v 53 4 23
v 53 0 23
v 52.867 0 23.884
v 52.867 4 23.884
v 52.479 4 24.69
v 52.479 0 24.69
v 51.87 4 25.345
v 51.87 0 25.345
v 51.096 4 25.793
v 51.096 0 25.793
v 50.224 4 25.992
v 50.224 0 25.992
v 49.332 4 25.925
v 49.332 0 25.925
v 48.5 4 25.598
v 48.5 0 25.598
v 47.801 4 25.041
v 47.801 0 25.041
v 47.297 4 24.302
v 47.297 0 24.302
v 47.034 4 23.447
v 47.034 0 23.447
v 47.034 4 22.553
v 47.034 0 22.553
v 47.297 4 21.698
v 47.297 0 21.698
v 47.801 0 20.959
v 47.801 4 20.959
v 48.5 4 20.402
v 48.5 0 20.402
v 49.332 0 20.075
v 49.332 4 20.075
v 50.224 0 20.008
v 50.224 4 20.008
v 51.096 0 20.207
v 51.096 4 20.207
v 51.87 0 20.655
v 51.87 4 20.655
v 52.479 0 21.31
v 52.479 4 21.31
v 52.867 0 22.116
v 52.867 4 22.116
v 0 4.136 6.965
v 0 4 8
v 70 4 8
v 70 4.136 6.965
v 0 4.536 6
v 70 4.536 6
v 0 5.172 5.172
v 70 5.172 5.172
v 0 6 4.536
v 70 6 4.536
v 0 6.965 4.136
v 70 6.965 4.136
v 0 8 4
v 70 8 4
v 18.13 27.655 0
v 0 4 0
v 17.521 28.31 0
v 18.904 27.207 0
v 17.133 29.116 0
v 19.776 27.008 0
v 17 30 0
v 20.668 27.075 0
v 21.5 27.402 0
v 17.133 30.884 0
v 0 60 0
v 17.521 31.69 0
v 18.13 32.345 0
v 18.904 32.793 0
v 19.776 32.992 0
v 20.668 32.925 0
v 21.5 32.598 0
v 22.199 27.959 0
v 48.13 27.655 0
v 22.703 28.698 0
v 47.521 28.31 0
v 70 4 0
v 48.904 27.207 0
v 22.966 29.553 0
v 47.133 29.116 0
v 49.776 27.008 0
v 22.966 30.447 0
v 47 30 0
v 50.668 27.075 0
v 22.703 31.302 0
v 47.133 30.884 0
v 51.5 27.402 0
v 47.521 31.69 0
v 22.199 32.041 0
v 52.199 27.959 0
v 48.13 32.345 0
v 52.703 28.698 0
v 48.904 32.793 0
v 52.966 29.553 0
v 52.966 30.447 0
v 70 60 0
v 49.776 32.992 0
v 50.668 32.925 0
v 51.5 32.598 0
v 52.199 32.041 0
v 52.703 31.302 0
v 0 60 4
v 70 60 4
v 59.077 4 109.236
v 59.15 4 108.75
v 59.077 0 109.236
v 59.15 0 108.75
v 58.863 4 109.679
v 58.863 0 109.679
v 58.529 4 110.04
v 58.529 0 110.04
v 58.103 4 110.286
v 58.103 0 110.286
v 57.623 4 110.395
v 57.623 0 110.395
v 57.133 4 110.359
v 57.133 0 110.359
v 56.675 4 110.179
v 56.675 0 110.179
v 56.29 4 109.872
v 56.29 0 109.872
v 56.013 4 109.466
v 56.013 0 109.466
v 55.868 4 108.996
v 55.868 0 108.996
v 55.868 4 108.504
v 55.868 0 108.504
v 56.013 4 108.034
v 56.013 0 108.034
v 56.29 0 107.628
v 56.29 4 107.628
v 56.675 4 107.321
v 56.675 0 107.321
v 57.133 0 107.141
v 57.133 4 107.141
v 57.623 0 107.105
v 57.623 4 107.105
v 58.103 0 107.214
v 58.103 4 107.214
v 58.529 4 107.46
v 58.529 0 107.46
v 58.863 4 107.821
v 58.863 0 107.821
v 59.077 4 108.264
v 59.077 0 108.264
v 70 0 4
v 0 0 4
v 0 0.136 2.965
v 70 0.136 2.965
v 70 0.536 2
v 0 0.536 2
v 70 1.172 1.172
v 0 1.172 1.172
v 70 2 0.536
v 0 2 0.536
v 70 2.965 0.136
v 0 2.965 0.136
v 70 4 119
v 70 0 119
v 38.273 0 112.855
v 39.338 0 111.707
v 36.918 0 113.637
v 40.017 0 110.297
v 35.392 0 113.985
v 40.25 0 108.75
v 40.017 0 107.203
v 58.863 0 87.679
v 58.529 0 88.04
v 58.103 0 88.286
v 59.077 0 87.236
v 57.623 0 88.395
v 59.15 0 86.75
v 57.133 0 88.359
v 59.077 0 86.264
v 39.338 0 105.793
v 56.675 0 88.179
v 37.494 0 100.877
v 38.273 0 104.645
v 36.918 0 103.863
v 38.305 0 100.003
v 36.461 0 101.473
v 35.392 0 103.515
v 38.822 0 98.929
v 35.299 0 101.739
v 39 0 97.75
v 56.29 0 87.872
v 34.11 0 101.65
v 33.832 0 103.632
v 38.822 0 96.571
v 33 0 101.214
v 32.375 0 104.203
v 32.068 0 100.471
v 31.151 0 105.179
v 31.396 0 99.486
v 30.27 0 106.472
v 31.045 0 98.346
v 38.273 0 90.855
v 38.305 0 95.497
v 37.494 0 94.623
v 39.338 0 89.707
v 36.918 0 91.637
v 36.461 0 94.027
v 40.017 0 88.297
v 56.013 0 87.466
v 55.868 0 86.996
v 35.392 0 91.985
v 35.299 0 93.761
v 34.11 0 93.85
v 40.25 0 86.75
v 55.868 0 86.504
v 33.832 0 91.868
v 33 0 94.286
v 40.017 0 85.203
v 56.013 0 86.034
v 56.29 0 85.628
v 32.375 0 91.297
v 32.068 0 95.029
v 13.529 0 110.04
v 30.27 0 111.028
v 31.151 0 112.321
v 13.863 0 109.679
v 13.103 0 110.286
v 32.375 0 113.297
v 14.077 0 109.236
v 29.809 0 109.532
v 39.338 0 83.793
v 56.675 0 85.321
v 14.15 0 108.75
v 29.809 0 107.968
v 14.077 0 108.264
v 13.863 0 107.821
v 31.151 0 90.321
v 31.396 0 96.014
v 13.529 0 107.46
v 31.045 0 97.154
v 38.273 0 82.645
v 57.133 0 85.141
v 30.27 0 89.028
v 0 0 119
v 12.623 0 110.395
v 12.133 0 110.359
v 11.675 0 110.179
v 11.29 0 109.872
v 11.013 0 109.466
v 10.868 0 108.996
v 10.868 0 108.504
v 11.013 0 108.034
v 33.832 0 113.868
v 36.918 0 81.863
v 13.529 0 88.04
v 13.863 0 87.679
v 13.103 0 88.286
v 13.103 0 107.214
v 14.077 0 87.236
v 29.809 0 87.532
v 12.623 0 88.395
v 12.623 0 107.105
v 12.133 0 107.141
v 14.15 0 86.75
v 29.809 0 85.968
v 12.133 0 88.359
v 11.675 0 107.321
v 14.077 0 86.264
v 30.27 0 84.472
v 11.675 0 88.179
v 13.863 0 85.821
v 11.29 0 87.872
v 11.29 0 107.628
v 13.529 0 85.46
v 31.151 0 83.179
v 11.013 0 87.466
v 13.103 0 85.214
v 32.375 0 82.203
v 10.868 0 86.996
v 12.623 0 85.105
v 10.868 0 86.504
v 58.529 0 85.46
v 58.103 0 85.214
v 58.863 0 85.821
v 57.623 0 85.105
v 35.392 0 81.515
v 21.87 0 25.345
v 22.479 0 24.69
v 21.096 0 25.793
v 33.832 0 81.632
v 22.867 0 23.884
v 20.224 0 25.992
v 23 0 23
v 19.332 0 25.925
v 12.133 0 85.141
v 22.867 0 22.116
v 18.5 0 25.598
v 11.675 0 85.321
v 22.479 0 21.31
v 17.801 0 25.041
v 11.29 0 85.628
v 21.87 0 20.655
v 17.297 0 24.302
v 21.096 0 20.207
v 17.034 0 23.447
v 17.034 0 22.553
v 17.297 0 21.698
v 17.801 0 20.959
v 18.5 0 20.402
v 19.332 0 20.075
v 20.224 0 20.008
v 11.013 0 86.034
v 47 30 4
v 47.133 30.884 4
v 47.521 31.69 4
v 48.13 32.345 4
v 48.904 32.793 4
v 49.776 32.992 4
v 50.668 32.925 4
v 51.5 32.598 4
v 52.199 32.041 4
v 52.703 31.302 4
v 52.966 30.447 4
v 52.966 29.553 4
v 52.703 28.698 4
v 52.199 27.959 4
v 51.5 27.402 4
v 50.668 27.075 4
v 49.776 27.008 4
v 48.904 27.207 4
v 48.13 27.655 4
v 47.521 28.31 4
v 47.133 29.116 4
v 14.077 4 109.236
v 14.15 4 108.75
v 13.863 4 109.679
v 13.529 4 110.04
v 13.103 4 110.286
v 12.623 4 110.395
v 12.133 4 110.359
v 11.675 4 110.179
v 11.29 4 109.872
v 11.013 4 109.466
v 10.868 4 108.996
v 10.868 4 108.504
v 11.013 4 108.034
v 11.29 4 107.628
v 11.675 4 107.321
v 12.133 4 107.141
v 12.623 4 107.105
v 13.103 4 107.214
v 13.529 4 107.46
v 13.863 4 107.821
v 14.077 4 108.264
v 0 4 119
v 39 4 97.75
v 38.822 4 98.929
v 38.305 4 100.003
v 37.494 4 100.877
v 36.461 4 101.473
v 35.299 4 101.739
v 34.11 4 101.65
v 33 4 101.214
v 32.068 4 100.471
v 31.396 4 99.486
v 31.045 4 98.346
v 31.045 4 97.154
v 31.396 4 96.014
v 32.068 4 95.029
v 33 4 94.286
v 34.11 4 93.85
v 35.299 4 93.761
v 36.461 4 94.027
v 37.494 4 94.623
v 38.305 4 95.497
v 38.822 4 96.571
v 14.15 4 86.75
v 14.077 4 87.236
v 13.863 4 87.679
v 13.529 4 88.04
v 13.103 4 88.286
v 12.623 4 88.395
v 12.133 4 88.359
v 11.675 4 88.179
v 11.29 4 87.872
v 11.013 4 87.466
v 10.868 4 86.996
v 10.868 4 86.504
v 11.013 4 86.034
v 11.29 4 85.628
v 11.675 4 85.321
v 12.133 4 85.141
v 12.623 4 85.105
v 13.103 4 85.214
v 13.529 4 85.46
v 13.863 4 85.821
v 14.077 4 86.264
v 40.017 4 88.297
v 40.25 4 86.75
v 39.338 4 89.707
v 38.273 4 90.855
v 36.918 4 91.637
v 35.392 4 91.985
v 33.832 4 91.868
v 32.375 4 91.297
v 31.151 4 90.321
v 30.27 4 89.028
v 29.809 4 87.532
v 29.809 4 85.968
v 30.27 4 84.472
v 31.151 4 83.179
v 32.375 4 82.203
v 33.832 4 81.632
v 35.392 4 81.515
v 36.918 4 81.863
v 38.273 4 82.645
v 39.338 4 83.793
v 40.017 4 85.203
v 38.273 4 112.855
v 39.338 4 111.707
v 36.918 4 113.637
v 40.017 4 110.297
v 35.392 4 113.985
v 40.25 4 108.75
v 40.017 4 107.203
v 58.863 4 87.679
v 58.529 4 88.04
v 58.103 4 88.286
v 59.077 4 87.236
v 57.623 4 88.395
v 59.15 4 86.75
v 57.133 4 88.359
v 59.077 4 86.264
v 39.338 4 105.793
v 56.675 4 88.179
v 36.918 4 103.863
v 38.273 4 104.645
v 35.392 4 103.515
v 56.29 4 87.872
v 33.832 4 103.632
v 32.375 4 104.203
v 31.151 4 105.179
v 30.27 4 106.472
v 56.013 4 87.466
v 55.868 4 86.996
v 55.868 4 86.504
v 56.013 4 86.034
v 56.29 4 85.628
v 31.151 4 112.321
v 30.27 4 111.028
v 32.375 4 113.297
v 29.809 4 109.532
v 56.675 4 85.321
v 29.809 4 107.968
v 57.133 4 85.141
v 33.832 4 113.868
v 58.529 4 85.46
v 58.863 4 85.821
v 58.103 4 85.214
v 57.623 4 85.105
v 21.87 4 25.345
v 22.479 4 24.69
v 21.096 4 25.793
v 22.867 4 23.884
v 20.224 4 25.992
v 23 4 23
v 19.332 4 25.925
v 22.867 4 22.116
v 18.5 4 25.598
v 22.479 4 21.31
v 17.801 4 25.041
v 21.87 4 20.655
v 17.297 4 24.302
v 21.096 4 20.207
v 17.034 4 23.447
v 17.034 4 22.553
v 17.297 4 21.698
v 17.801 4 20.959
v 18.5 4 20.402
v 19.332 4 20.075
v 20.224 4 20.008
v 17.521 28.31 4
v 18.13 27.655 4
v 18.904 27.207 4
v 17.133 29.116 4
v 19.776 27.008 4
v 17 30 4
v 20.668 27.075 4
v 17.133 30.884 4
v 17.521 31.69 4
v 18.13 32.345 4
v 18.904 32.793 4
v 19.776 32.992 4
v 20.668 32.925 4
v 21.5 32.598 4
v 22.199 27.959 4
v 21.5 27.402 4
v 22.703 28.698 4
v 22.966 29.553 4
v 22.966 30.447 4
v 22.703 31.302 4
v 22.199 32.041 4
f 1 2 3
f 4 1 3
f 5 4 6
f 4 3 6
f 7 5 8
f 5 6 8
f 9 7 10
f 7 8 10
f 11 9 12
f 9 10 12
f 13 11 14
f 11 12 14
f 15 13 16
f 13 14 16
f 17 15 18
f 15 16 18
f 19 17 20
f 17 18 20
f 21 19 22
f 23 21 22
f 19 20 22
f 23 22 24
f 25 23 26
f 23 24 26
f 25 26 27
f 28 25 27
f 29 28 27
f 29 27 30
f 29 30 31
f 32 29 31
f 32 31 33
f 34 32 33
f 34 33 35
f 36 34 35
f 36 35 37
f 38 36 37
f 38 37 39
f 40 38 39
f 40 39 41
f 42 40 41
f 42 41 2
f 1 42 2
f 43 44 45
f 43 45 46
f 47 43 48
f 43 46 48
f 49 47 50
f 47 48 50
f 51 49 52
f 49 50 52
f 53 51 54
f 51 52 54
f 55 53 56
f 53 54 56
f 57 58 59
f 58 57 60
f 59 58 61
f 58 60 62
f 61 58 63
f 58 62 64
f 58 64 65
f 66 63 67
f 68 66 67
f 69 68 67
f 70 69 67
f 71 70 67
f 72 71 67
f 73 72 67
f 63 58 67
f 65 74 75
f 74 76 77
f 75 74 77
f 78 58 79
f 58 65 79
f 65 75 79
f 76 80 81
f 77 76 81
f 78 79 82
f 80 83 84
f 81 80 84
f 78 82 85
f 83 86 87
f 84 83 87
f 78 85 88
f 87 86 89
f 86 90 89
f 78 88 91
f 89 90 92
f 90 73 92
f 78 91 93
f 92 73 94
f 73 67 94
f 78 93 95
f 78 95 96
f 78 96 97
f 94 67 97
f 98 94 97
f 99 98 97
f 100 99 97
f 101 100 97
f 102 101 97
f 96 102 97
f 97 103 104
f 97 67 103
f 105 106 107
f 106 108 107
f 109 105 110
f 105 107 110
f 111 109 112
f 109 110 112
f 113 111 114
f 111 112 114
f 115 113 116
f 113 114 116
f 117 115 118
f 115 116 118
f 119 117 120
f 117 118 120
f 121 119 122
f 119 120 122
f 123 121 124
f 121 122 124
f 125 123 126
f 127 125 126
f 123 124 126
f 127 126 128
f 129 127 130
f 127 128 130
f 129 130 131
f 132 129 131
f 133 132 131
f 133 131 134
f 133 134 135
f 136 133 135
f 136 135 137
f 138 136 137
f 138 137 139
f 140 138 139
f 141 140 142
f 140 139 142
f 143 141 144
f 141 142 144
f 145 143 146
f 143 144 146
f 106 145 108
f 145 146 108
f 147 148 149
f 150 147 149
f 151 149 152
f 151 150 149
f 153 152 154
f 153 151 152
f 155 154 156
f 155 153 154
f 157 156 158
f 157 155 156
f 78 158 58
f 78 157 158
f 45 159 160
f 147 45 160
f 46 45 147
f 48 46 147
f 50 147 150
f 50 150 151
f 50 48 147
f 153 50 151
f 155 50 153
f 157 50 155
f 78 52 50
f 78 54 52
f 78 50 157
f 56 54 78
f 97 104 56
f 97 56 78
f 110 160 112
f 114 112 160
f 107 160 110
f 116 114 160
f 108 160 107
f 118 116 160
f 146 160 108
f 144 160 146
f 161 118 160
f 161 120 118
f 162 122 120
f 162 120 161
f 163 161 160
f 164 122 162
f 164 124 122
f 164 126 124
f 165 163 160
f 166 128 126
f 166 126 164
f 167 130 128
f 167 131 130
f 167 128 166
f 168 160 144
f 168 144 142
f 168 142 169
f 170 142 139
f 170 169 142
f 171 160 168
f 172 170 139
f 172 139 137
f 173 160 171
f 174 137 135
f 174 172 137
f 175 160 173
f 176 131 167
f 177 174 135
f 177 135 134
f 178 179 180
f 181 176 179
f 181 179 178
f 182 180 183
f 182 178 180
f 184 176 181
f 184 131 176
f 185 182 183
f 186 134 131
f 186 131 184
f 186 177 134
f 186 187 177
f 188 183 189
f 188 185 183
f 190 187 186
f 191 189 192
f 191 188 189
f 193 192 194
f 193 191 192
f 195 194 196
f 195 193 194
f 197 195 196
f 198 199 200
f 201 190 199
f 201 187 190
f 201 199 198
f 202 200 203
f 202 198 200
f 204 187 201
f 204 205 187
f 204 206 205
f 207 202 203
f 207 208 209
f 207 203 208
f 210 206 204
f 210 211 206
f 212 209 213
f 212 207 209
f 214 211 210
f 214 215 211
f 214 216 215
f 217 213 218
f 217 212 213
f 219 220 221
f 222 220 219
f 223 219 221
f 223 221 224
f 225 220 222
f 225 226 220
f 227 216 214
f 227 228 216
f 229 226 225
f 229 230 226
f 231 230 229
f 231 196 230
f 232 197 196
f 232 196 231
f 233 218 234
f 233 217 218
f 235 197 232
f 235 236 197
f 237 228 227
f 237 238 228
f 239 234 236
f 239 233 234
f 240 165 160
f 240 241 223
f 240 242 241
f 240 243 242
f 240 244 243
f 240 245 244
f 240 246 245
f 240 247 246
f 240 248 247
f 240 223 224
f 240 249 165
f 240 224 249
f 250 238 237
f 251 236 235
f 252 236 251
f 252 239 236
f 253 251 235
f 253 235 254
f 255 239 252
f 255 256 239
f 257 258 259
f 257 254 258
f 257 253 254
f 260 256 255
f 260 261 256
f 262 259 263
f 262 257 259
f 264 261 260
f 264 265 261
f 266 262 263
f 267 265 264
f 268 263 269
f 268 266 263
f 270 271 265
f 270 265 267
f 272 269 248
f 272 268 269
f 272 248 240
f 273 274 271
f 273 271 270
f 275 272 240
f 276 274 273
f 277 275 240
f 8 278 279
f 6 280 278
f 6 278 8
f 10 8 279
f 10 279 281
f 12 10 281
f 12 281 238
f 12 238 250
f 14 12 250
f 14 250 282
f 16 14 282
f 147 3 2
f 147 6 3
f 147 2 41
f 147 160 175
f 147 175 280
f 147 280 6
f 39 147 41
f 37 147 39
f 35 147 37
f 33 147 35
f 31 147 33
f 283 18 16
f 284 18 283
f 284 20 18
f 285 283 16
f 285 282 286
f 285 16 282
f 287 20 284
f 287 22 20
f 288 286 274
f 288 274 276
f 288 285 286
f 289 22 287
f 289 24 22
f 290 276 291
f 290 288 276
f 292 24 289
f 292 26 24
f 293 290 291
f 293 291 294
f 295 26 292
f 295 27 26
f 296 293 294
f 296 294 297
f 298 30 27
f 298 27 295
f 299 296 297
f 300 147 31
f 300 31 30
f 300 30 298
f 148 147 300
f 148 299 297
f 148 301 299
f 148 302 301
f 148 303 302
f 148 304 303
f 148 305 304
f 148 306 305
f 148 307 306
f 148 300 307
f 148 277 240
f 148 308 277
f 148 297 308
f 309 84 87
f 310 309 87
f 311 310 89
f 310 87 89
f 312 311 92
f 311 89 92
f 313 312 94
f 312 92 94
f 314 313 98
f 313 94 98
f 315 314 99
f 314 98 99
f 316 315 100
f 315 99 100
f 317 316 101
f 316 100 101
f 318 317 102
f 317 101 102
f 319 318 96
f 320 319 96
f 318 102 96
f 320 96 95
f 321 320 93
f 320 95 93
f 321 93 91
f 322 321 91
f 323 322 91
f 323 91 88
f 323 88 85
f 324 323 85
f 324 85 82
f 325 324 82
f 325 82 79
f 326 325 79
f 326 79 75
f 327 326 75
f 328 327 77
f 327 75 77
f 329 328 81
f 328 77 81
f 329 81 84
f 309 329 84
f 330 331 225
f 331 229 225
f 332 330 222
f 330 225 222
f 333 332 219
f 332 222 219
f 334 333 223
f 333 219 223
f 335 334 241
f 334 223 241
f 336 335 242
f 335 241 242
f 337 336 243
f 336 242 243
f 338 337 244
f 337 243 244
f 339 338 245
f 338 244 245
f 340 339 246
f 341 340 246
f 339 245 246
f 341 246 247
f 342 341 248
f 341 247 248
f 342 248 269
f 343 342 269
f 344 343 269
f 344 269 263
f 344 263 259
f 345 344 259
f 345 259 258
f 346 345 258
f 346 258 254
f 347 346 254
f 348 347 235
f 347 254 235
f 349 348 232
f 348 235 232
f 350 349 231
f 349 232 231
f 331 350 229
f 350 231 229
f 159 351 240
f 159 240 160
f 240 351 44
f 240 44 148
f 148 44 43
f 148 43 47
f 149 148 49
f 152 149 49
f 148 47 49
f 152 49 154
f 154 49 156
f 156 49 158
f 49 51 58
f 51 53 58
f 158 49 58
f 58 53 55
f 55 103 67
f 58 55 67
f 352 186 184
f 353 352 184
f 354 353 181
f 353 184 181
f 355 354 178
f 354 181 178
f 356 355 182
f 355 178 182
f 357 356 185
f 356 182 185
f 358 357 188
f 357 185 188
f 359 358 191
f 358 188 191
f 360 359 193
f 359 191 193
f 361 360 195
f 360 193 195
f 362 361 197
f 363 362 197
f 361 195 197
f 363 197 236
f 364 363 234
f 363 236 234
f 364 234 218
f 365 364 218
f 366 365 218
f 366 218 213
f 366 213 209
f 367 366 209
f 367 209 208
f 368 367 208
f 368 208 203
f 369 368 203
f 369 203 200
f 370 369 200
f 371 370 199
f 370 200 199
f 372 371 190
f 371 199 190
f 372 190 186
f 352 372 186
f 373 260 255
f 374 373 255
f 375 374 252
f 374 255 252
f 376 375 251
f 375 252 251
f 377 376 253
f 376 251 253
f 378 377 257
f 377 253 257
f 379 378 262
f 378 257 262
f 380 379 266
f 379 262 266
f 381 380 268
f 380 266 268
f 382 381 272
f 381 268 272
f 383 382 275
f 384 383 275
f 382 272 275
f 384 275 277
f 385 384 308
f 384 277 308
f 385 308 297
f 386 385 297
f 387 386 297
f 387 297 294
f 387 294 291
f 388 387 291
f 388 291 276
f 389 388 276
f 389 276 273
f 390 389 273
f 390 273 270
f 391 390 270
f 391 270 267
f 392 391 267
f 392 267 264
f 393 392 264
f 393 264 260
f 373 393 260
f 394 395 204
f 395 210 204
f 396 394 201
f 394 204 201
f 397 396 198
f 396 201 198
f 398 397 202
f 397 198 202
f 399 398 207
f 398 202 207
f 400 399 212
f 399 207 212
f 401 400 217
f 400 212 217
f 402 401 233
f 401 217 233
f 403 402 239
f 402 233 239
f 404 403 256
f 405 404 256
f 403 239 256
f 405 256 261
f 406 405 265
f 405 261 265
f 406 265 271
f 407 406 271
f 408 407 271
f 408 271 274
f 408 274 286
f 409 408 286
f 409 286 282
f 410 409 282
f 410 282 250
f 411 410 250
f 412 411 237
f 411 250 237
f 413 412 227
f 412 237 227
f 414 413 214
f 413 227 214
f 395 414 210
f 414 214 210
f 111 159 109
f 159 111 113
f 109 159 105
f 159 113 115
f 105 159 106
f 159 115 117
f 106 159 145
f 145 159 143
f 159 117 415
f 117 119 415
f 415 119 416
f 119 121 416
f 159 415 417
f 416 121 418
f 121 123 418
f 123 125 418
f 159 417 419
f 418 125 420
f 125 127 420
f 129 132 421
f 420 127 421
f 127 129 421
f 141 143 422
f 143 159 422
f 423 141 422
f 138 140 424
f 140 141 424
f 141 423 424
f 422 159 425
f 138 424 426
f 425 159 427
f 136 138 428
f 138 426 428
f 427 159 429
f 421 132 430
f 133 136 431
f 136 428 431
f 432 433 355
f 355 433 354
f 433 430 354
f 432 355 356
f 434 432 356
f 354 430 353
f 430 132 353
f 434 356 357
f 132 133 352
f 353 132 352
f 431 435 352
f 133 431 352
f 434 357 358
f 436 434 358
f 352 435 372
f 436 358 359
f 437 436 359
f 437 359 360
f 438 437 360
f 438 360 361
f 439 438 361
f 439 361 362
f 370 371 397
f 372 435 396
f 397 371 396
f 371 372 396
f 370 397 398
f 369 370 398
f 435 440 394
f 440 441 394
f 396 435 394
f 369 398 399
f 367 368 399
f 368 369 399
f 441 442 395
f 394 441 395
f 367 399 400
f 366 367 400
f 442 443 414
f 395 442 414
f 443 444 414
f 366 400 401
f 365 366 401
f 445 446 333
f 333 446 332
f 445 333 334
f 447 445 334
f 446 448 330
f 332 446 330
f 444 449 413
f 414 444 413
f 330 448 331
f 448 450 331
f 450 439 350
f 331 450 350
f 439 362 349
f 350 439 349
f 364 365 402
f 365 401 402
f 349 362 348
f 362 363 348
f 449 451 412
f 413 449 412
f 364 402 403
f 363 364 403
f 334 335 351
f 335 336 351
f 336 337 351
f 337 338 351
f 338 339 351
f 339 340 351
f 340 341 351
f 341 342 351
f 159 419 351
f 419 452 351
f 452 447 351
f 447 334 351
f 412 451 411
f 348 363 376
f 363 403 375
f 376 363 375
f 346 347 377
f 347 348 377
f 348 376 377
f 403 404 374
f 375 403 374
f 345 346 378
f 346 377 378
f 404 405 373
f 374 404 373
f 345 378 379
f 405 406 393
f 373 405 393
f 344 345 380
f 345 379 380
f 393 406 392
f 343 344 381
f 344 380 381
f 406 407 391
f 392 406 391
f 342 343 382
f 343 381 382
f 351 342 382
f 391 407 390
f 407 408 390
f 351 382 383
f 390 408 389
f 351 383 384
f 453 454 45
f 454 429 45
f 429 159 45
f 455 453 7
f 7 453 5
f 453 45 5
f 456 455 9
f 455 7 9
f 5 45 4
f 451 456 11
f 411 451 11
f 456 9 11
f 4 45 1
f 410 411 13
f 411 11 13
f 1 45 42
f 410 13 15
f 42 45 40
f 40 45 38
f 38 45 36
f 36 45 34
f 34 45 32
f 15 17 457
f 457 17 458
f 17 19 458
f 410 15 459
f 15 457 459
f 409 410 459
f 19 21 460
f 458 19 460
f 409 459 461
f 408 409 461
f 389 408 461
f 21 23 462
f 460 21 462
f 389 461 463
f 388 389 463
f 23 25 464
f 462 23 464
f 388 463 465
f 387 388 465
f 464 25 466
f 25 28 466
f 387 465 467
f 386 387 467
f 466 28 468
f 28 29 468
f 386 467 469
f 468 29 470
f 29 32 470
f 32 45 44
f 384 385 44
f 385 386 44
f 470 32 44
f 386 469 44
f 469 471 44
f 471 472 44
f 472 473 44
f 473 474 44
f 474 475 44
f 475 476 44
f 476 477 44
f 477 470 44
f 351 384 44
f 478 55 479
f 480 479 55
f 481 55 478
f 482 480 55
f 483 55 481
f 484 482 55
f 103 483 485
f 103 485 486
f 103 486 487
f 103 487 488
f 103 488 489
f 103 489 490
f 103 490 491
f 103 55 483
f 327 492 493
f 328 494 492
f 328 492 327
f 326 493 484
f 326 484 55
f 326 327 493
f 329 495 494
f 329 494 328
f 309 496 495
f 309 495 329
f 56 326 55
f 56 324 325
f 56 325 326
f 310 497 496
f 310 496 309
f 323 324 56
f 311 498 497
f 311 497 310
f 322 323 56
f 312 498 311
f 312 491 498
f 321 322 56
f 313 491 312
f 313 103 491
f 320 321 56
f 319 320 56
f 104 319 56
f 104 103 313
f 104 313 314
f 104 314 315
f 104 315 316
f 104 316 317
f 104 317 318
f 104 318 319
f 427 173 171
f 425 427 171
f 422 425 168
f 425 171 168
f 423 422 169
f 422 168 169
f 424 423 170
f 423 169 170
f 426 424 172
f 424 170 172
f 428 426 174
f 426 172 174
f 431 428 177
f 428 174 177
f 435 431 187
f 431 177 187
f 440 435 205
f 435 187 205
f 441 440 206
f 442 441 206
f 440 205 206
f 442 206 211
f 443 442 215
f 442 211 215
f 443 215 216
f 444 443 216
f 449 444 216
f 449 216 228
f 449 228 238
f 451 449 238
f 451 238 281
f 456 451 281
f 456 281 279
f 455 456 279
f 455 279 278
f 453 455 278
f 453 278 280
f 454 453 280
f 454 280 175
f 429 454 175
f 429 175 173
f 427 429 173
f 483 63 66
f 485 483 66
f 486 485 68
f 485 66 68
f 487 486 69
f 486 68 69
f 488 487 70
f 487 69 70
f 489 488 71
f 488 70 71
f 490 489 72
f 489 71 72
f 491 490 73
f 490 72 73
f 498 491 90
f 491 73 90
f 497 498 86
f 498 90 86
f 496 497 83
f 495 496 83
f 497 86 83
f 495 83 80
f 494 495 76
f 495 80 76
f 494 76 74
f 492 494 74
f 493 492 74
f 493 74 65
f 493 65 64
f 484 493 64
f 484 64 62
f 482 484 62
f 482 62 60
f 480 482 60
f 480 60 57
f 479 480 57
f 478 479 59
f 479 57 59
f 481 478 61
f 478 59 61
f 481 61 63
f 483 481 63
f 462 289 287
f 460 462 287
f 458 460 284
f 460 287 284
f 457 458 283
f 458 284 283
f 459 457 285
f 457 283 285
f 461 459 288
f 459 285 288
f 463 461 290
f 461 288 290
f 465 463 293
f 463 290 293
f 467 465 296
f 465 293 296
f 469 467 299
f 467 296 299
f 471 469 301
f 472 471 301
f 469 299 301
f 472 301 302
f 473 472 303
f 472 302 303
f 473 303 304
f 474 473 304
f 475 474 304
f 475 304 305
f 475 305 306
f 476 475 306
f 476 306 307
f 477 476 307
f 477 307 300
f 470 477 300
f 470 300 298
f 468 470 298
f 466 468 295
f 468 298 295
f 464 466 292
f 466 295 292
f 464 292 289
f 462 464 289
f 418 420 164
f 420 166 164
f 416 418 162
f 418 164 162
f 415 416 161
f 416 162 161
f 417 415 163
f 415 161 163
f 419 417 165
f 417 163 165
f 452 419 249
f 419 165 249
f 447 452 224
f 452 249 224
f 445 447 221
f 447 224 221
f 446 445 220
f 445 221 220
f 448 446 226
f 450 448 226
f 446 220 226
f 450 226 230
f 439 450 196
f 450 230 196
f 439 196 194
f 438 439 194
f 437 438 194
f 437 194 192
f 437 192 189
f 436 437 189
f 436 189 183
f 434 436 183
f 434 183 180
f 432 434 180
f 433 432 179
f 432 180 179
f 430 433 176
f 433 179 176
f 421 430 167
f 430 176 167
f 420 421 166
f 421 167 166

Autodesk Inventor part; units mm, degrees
ref_plane "YZ Plane" through (0, 0, 0) normal (1, 0, 0) x (0, 1, 0)
ref_plane "XZ Plane" through (0, 0, 0) normal (0, 1, 0) x (-1, 0, 0)
ref_plane "XY Plane" through (0, 0, 0) normal (0, 0, 1) x (1, 0, 0)
sketch "Sketch1" plane through (0, 0, 0) normal (0, 0, 1) x (1, 0, 0)
  line L0 (0, 0) -> (0, 60)
  line L1 (0, 60) -> (70, 60)
  line L2 (70, 60) -> (70, 0)
  line L3 (70, 0) -> (0, 0)
  dimension "d0" = 60
  dimension "d1" = 70
  dimension "d2" = 60
extrude "Extrusion1" add sketch "Sketch1" along normal blind 4
sketch "Sketch2" plane through (0, 0, 4) normal (0, 0, 1) x (1, 0, 0)
  line L0 (0, 0) -> (70, 0) projected
  line L1 (70, 0) -> (70, 60) projected
  line L2 (0, 0) -> (70, 0)
  line L3 (70, 0) -> (70, 4)
  line L4 (70, 4) -> (0, 4)
  line L5 (0, 4) -> (0, 0)
  dimension "d5" = 4
extrude "Extrusion2" add sketch "Sketch2" along normal blind 115
sketch "Sketch3" plane through (0, 0, 0) normal (0, 0, -1) x (-1, 0, 0)
  line L0 (-70, 60) -> (-70, 0) projected
  circle A0 centre (-50, 30) radius 3
  circle A1 centre (-20, 30) radius 3
  dimension "d15" = 6
  dimension "d16" = 6
extrude "Extrusion3" cut sketch "Sketch3" against normal blind 10
sketch "Sketch4" plane through (0, 0, 0) normal (0, -1, 0) x (1, 0, 0)
  line L0 (70, 0) -> (70, 119) projected
  line L1 (23, 0) -> (17, 0) projected
  line L2 (17, 0) -> (23, 0)
  circle A0 centre (50, 23) radius 3
  circle A1 centre (20, 23) radius 3
  dimension "d26" = 6
  dimension "d27" = 6
extrude "Extrusion4" cut sketch "Sketch4" against normal blind 10
sketch "Sketch5" plane through (0, 0, 0) normal (0, -1, 0) x (1, 0, 0)
  line L0 (70, 4) -> (70, 119) projected
  circle A0 centre (50, 23) radius 3 projected
  circle A1 centre (35, 108.75) radius 5.25
  circle A2 centre (35, 86.75) radius 5.25
  circle A3 centre (35, 97.75) radius 4
  circle A4 centre (55.25, 86.75) radius 2
  circle A5 centre (55.25, 108.75) radius 2
  circle A6 centre (14.75, 86.75) radius 2
  circle A7 centre (14.75, 108.75) radius 2
  point P0 (0, 0)
  point P1 (20, 23)
  dimension "d36" = 8
  dimension "d41" = 4
  dimension "d42" = 4
  dimension "d43" = 4
  dimension "d44" = 4
extrude "Extrusion5" cut sketch "Sketch5" against normal blind 10 contours A1 | A2 | A3 | A4 | A5 | A6 | A7
sketch "Sketch6" plane through (70, 0, 0) normal (1, 0, 0) x (0, 0, -1)
  line L0 (0, 0) -> (-119, 0) projected
  line L1 (0, 4) -> (0, 4)
  line L2 (-4, 4) -> (-119, 4) projected
  line L3 (0, 60) -> (0, 0) projected
  line L4 (-4, 0) -> (-4, 0)
  arc A0 (-4, 0) -> (0, 4) centre (-4, 4) ccw
  line L5 (0, 4) -> (0, 0)
  line L6 (-4, 0) -> (0, 0)
  dimension "d47" = 4
  dimension "d48" = 4
  dimension "d49" = 4
extrude "Extrusion6" cut sketch "Sketch6" against normal blind 100
sketch "Sketch7" plane through (70, 60, 4) normal (1, 0, 0) x (0, 0, -1)
  line L0 (0, -56) -> (0, 0) projected
  line L1 (0, -52) -> (0, -52)
  line L2 (-4, -56) -> (-4, -56)
  arc A0 (-4, -56) -> (0, -52) centre (-4, -52) ccw
  line L3 (0, -52) -> (0, -56)
  line L4 (0, -56) -> (-115, -56) projected
  line L5 (-4, -56) -> (0, -56)
  point P0 (4, -60)
  dimension "d52" = 4
  dimension "d53" = 4
  dimension "d54" = 4
extrude "Extrusion7" add sketch "Sketch7" against normal blind 70
sketch "Sketch8" plane through (0, 0, 119) normal (0, -1, 0) x (1, 0, 0)
  circle A0 centre (35, -10.25) radius 5.25 projected
  circle A1 centre (55.25, -32.25) radius 2 projected
  circle A2 centre (55.25, -32.25) radius 2
  circle A3 centre (55.25, -10.25) radius 2 projected
  circle A4 centre (55.25, -10.25) radius 2
  circle A5 centre (14.75, -10.25) radius 2 projected
  circle A6 centre (14.75, -10.25) radius 2
  circle A7 centre (14.75, -32.25) radius 2 projected
  circle A8 centre (14.75, -32.25) radius 2
  point P0 (0, -119)
extrude "Extrusion8" add sketch "Sketch8" against normal blind 4 contours A1 | A3 | A5 | A7
sketch "Sketch9" plane through (0, 0, 119) normal (0, -1, 0) x (1, 0, 0)
  circle A0 centre (35, -10.25) radius 5.25 projected
  circle A1 centre (57.5, -10.25) radius 1.65
  circle A2 centre (12.5, -10.25) radius 1.65
  circle A3 centre (57.5, -32.25) radius 1.65
  circle A4 centre (12.5, -32.25) radius 1.65
  point P0 (0, -119)
  dimension "d62" = 3.3
  dimension "d63" = 3.3
  dimension "d66" = 3.3
  dimension "d67" = 3.3
extrude "Extrusion9" cut sketch "Sketch9" against normal blind 4 contours A1 | A2 | A3 | A4
